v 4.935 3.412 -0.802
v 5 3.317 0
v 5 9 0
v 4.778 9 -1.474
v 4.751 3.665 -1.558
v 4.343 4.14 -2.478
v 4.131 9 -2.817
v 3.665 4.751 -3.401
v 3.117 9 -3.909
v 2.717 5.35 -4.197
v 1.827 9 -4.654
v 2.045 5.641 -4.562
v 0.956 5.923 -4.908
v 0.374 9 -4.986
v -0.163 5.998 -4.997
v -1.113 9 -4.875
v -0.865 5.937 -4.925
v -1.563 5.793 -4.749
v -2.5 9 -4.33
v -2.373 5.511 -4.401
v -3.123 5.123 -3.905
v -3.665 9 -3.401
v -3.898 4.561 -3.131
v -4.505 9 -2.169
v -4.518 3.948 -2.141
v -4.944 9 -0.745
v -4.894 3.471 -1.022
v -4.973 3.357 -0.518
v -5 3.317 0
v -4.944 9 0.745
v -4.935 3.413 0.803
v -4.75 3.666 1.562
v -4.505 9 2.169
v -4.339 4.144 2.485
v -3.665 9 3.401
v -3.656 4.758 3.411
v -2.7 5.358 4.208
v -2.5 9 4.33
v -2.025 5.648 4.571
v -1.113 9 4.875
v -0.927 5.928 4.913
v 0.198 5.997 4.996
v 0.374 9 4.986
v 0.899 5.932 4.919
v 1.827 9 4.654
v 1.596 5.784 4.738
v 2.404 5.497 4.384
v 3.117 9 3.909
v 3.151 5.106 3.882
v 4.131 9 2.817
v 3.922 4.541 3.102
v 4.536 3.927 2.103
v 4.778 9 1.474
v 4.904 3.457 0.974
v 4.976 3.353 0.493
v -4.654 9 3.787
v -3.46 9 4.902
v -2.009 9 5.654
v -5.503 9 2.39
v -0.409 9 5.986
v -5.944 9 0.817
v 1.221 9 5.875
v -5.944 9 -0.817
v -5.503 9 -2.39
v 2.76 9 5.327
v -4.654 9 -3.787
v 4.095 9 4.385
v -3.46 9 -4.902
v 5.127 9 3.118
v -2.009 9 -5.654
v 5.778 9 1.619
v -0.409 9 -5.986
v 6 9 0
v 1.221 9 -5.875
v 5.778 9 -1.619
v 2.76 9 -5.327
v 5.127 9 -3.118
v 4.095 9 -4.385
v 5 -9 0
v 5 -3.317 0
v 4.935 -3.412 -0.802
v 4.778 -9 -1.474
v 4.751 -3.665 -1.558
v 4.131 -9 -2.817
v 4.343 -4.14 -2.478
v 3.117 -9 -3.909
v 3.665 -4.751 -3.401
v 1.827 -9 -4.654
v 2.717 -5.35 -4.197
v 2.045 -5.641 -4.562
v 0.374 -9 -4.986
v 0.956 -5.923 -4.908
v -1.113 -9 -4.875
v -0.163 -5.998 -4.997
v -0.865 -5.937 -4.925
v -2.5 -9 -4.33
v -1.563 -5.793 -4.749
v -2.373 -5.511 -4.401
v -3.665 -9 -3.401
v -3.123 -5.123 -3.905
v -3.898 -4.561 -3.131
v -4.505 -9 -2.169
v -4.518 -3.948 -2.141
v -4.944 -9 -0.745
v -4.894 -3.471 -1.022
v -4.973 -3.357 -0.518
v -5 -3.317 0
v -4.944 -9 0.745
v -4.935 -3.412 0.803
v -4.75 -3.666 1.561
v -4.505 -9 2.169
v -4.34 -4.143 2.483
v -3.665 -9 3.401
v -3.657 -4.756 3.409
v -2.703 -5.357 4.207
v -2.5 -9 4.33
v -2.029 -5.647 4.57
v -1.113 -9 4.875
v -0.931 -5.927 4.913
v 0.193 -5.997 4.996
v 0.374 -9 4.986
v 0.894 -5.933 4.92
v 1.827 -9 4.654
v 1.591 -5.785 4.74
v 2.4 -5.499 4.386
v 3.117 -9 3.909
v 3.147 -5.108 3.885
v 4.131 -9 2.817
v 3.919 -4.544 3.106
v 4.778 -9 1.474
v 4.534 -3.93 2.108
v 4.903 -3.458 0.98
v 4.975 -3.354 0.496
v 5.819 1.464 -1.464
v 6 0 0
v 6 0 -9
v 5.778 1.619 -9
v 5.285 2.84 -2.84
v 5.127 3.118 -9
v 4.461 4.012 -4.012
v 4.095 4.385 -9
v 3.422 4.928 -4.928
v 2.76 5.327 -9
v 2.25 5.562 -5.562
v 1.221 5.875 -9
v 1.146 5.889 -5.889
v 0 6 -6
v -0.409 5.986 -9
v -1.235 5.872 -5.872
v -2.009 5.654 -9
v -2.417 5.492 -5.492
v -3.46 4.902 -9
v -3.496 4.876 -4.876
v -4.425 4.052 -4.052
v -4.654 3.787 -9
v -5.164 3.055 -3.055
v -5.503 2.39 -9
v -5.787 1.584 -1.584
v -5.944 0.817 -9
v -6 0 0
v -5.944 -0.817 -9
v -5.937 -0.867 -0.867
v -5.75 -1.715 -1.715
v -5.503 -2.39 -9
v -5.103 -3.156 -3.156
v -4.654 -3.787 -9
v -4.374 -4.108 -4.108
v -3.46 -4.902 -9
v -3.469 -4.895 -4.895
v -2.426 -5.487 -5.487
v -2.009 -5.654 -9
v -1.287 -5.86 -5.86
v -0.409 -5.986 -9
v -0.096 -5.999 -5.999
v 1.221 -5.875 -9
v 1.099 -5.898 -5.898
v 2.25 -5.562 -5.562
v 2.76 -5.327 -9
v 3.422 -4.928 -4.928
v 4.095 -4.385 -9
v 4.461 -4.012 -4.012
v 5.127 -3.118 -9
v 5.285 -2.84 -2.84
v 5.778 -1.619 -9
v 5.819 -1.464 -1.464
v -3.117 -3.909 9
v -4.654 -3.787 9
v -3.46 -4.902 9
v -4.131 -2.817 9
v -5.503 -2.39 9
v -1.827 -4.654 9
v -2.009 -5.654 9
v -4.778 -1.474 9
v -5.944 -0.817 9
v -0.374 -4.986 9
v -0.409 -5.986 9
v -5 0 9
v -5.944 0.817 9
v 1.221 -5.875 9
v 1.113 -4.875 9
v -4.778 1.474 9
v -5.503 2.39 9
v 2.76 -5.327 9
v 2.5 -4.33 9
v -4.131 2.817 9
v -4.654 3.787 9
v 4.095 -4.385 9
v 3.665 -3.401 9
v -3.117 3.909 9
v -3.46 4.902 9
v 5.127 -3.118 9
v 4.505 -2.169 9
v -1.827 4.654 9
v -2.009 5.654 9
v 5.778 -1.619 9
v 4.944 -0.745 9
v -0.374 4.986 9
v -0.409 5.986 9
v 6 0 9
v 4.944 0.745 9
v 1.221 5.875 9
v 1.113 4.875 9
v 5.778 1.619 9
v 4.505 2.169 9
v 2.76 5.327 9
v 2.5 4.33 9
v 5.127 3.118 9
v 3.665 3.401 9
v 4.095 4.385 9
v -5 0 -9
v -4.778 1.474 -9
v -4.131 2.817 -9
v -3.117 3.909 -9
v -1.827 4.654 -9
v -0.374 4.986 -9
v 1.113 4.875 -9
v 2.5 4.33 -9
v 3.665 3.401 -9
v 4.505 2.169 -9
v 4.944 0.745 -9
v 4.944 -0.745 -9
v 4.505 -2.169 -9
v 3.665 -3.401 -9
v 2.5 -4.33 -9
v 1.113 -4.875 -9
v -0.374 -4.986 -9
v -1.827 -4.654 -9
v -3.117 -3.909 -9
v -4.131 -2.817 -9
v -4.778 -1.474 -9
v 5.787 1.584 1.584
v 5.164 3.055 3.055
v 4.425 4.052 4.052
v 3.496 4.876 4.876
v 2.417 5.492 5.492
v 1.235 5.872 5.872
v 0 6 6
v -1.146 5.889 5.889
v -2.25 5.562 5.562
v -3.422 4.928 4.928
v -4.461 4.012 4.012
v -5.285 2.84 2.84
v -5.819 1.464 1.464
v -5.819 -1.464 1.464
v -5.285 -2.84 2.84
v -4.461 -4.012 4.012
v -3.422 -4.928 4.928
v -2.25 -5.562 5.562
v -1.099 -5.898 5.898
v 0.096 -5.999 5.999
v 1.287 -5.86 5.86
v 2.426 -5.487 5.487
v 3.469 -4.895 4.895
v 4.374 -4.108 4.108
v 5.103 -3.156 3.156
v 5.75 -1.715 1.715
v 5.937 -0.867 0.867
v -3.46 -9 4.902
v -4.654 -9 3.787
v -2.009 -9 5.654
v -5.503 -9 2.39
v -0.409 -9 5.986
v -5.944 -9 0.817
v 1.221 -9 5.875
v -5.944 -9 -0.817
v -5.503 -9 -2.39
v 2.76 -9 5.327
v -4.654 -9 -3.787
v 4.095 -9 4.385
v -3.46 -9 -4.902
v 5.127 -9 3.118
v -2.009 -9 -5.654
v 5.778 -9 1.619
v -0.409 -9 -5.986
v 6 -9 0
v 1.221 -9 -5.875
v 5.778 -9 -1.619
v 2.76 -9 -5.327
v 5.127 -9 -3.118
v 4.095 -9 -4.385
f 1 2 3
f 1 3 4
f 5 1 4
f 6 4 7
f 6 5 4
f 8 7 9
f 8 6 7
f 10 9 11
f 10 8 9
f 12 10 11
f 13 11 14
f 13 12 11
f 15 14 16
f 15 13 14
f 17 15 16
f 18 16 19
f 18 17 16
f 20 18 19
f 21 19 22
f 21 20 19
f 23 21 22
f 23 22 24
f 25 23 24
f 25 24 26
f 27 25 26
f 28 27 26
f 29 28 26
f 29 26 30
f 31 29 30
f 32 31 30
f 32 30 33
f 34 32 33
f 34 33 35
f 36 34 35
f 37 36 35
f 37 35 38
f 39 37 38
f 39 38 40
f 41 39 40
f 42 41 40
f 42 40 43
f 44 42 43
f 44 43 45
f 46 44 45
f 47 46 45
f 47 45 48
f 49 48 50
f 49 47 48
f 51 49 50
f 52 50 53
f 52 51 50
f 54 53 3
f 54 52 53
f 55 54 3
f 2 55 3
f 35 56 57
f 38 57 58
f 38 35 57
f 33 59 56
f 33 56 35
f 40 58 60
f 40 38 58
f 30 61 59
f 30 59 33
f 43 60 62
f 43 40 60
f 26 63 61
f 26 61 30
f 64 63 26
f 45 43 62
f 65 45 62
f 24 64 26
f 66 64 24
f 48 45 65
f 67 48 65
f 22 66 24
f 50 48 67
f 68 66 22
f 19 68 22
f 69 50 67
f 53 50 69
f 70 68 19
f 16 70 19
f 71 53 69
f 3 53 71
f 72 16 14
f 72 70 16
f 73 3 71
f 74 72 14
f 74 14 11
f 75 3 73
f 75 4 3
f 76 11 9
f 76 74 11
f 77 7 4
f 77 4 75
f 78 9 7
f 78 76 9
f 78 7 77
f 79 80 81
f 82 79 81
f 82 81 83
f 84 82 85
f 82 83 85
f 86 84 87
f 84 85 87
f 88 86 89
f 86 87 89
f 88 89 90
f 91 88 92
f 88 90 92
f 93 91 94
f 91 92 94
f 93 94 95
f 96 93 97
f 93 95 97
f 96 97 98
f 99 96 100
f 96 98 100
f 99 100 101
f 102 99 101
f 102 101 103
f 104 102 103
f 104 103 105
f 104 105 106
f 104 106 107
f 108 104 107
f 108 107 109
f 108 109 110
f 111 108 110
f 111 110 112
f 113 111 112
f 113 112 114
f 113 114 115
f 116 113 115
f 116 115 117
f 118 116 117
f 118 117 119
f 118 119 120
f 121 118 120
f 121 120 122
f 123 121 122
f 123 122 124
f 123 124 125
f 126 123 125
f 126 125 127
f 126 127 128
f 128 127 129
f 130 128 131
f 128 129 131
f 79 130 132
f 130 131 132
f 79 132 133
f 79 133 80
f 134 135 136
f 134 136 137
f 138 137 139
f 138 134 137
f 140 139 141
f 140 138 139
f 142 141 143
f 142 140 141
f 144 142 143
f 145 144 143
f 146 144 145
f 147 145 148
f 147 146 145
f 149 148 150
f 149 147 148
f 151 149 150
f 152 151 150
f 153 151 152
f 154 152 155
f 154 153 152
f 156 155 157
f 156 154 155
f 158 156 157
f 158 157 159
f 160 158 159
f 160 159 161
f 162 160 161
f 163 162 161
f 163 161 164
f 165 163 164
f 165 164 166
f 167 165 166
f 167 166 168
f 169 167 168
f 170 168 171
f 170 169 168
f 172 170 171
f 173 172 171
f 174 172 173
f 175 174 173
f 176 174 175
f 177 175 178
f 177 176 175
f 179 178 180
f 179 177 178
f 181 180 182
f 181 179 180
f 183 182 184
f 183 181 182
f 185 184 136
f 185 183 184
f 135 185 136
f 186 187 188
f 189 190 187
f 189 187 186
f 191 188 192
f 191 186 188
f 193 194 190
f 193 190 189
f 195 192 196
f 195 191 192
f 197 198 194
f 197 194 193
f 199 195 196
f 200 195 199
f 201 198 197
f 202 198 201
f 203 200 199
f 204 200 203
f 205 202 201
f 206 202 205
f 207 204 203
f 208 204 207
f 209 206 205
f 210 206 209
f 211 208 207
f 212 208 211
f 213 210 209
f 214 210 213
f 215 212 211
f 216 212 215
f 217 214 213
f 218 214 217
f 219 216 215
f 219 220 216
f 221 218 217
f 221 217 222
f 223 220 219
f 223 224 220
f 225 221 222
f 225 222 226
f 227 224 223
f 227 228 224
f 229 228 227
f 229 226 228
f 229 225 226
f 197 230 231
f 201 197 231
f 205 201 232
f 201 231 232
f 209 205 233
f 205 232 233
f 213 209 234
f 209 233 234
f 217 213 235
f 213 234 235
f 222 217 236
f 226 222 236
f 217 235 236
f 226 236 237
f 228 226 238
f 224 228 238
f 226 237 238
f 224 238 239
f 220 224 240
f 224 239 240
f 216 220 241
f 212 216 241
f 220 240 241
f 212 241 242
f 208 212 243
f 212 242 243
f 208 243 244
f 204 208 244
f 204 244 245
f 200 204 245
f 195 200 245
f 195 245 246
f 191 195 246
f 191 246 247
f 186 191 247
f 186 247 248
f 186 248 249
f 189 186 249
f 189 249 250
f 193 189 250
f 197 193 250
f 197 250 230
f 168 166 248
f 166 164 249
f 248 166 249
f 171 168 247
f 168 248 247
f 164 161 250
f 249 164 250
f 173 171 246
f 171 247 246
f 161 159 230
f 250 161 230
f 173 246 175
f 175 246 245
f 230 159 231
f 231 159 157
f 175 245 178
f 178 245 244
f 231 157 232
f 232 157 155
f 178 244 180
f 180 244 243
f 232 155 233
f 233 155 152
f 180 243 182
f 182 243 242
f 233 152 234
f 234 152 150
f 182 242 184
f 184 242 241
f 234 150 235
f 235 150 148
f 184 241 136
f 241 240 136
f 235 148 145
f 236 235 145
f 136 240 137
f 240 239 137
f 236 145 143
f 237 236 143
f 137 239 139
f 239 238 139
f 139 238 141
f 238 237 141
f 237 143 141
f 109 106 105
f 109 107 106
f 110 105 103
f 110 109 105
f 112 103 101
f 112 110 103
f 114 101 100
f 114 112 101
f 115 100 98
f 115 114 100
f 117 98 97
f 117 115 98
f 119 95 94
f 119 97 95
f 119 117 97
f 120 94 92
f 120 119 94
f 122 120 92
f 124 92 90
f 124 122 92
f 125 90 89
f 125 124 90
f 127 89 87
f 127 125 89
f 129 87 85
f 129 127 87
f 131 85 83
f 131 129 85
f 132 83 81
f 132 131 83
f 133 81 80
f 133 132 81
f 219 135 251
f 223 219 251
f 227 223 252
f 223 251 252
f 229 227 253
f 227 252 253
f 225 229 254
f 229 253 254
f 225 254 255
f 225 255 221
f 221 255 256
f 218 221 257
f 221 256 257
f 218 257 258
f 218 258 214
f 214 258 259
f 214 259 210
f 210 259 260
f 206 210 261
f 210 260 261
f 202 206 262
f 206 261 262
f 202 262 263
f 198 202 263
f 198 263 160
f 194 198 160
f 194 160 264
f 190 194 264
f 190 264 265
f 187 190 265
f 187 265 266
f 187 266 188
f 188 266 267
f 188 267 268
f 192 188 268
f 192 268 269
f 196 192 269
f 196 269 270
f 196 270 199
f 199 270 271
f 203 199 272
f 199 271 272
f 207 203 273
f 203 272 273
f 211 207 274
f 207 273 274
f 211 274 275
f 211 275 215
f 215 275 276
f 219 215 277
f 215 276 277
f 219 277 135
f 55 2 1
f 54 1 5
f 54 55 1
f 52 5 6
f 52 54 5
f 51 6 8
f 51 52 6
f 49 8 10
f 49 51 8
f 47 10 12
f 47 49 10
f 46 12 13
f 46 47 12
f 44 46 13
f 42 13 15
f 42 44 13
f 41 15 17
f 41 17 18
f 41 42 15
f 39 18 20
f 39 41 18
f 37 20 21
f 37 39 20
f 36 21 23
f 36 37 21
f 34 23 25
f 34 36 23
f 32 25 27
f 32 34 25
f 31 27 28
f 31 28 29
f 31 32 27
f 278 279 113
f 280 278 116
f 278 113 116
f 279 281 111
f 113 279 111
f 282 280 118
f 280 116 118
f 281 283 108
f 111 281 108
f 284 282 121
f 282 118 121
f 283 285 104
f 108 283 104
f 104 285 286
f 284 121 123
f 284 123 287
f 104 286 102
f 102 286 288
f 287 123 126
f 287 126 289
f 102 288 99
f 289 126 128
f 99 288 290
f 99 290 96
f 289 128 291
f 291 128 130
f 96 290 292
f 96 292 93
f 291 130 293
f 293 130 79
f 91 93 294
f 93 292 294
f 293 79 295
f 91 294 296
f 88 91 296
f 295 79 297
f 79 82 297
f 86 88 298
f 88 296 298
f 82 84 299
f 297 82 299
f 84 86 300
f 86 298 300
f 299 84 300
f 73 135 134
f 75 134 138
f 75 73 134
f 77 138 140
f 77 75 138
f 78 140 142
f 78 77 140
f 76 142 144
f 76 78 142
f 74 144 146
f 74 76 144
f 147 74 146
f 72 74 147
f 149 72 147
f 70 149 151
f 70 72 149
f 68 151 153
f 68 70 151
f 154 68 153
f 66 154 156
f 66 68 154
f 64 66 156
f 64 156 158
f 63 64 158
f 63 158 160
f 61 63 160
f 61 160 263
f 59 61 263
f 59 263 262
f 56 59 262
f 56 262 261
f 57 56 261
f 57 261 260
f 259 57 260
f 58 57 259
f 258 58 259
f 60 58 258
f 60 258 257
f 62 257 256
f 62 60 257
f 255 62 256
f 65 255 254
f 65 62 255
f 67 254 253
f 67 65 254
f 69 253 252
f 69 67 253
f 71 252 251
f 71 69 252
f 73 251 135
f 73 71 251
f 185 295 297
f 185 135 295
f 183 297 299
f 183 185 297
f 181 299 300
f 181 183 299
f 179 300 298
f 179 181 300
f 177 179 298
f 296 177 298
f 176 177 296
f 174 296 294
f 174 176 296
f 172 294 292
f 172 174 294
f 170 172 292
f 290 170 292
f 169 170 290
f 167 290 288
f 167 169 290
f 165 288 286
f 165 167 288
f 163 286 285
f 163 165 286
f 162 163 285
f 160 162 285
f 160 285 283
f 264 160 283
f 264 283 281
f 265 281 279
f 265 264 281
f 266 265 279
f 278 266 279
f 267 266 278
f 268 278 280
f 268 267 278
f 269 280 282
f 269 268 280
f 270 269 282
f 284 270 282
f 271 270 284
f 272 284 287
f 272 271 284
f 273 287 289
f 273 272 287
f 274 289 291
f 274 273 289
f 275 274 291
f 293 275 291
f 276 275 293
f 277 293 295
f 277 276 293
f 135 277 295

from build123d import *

# Parameters (mm, degrees)
BOSS_EXTRUDE1_DEPTH      = 9
BOSS_EXTRUDE1_DEPTH_BACK = 9
SKETCH1_R                = 6
SKETCH1_R_2              = 5
BOSS_EXTRUDE2_DEPTH      = 9
BOSS_EXTRUDE2_DEPTH_BACK = 9
SKETCH2_R                = 6
SKETCH3_R                = 5
CUT_EXTRUDE1_DEPTH       = 22.000000043


with BuildPart() as part:
    # Sketch1 → Boss-Extrude1 (new, two sides: drawn at the far end of the back side and taken through both)
    with BuildSketch(Plane(origin=(0, 0, 0), x_dir=(1, 0, 0), z_dir=(0, 1, 0)).offset(-BOSS_EXTRUDE1_DEPTH_BACK)):
        Circle(SKETCH1_R)
        Circle(SKETCH1_R_2, mode=Mode.SUBTRACT)
    extrude(amount=BOSS_EXTRUDE1_DEPTH + BOSS_EXTRUDE1_DEPTH_BACK)

    # Sketch2 → Boss-Extrude2 (add, two sides: drawn at the far end of the back side and taken through both)
    with BuildSketch(Plane.XY.offset(-BOSS_EXTRUDE2_DEPTH_BACK)):
        Circle(SKETCH2_R)
    extrude(amount=BOSS_EXTRUDE2_DEPTH + BOSS_EXTRUDE2_DEPTH_BACK)

    # Sketch3 → Cut-Extrude1 (cut, through all)
    with BuildSketch(Plane(origin=(0, 0, -9), x_dir=(-1, 0, 0), z_dir=(0, 0, -1))):
        Circle(SKETCH3_R)
    extrude(amount=-CUT_EXTRUDE1_DEPTH, mode=Mode.SUBTRACT)


solid = part.part
